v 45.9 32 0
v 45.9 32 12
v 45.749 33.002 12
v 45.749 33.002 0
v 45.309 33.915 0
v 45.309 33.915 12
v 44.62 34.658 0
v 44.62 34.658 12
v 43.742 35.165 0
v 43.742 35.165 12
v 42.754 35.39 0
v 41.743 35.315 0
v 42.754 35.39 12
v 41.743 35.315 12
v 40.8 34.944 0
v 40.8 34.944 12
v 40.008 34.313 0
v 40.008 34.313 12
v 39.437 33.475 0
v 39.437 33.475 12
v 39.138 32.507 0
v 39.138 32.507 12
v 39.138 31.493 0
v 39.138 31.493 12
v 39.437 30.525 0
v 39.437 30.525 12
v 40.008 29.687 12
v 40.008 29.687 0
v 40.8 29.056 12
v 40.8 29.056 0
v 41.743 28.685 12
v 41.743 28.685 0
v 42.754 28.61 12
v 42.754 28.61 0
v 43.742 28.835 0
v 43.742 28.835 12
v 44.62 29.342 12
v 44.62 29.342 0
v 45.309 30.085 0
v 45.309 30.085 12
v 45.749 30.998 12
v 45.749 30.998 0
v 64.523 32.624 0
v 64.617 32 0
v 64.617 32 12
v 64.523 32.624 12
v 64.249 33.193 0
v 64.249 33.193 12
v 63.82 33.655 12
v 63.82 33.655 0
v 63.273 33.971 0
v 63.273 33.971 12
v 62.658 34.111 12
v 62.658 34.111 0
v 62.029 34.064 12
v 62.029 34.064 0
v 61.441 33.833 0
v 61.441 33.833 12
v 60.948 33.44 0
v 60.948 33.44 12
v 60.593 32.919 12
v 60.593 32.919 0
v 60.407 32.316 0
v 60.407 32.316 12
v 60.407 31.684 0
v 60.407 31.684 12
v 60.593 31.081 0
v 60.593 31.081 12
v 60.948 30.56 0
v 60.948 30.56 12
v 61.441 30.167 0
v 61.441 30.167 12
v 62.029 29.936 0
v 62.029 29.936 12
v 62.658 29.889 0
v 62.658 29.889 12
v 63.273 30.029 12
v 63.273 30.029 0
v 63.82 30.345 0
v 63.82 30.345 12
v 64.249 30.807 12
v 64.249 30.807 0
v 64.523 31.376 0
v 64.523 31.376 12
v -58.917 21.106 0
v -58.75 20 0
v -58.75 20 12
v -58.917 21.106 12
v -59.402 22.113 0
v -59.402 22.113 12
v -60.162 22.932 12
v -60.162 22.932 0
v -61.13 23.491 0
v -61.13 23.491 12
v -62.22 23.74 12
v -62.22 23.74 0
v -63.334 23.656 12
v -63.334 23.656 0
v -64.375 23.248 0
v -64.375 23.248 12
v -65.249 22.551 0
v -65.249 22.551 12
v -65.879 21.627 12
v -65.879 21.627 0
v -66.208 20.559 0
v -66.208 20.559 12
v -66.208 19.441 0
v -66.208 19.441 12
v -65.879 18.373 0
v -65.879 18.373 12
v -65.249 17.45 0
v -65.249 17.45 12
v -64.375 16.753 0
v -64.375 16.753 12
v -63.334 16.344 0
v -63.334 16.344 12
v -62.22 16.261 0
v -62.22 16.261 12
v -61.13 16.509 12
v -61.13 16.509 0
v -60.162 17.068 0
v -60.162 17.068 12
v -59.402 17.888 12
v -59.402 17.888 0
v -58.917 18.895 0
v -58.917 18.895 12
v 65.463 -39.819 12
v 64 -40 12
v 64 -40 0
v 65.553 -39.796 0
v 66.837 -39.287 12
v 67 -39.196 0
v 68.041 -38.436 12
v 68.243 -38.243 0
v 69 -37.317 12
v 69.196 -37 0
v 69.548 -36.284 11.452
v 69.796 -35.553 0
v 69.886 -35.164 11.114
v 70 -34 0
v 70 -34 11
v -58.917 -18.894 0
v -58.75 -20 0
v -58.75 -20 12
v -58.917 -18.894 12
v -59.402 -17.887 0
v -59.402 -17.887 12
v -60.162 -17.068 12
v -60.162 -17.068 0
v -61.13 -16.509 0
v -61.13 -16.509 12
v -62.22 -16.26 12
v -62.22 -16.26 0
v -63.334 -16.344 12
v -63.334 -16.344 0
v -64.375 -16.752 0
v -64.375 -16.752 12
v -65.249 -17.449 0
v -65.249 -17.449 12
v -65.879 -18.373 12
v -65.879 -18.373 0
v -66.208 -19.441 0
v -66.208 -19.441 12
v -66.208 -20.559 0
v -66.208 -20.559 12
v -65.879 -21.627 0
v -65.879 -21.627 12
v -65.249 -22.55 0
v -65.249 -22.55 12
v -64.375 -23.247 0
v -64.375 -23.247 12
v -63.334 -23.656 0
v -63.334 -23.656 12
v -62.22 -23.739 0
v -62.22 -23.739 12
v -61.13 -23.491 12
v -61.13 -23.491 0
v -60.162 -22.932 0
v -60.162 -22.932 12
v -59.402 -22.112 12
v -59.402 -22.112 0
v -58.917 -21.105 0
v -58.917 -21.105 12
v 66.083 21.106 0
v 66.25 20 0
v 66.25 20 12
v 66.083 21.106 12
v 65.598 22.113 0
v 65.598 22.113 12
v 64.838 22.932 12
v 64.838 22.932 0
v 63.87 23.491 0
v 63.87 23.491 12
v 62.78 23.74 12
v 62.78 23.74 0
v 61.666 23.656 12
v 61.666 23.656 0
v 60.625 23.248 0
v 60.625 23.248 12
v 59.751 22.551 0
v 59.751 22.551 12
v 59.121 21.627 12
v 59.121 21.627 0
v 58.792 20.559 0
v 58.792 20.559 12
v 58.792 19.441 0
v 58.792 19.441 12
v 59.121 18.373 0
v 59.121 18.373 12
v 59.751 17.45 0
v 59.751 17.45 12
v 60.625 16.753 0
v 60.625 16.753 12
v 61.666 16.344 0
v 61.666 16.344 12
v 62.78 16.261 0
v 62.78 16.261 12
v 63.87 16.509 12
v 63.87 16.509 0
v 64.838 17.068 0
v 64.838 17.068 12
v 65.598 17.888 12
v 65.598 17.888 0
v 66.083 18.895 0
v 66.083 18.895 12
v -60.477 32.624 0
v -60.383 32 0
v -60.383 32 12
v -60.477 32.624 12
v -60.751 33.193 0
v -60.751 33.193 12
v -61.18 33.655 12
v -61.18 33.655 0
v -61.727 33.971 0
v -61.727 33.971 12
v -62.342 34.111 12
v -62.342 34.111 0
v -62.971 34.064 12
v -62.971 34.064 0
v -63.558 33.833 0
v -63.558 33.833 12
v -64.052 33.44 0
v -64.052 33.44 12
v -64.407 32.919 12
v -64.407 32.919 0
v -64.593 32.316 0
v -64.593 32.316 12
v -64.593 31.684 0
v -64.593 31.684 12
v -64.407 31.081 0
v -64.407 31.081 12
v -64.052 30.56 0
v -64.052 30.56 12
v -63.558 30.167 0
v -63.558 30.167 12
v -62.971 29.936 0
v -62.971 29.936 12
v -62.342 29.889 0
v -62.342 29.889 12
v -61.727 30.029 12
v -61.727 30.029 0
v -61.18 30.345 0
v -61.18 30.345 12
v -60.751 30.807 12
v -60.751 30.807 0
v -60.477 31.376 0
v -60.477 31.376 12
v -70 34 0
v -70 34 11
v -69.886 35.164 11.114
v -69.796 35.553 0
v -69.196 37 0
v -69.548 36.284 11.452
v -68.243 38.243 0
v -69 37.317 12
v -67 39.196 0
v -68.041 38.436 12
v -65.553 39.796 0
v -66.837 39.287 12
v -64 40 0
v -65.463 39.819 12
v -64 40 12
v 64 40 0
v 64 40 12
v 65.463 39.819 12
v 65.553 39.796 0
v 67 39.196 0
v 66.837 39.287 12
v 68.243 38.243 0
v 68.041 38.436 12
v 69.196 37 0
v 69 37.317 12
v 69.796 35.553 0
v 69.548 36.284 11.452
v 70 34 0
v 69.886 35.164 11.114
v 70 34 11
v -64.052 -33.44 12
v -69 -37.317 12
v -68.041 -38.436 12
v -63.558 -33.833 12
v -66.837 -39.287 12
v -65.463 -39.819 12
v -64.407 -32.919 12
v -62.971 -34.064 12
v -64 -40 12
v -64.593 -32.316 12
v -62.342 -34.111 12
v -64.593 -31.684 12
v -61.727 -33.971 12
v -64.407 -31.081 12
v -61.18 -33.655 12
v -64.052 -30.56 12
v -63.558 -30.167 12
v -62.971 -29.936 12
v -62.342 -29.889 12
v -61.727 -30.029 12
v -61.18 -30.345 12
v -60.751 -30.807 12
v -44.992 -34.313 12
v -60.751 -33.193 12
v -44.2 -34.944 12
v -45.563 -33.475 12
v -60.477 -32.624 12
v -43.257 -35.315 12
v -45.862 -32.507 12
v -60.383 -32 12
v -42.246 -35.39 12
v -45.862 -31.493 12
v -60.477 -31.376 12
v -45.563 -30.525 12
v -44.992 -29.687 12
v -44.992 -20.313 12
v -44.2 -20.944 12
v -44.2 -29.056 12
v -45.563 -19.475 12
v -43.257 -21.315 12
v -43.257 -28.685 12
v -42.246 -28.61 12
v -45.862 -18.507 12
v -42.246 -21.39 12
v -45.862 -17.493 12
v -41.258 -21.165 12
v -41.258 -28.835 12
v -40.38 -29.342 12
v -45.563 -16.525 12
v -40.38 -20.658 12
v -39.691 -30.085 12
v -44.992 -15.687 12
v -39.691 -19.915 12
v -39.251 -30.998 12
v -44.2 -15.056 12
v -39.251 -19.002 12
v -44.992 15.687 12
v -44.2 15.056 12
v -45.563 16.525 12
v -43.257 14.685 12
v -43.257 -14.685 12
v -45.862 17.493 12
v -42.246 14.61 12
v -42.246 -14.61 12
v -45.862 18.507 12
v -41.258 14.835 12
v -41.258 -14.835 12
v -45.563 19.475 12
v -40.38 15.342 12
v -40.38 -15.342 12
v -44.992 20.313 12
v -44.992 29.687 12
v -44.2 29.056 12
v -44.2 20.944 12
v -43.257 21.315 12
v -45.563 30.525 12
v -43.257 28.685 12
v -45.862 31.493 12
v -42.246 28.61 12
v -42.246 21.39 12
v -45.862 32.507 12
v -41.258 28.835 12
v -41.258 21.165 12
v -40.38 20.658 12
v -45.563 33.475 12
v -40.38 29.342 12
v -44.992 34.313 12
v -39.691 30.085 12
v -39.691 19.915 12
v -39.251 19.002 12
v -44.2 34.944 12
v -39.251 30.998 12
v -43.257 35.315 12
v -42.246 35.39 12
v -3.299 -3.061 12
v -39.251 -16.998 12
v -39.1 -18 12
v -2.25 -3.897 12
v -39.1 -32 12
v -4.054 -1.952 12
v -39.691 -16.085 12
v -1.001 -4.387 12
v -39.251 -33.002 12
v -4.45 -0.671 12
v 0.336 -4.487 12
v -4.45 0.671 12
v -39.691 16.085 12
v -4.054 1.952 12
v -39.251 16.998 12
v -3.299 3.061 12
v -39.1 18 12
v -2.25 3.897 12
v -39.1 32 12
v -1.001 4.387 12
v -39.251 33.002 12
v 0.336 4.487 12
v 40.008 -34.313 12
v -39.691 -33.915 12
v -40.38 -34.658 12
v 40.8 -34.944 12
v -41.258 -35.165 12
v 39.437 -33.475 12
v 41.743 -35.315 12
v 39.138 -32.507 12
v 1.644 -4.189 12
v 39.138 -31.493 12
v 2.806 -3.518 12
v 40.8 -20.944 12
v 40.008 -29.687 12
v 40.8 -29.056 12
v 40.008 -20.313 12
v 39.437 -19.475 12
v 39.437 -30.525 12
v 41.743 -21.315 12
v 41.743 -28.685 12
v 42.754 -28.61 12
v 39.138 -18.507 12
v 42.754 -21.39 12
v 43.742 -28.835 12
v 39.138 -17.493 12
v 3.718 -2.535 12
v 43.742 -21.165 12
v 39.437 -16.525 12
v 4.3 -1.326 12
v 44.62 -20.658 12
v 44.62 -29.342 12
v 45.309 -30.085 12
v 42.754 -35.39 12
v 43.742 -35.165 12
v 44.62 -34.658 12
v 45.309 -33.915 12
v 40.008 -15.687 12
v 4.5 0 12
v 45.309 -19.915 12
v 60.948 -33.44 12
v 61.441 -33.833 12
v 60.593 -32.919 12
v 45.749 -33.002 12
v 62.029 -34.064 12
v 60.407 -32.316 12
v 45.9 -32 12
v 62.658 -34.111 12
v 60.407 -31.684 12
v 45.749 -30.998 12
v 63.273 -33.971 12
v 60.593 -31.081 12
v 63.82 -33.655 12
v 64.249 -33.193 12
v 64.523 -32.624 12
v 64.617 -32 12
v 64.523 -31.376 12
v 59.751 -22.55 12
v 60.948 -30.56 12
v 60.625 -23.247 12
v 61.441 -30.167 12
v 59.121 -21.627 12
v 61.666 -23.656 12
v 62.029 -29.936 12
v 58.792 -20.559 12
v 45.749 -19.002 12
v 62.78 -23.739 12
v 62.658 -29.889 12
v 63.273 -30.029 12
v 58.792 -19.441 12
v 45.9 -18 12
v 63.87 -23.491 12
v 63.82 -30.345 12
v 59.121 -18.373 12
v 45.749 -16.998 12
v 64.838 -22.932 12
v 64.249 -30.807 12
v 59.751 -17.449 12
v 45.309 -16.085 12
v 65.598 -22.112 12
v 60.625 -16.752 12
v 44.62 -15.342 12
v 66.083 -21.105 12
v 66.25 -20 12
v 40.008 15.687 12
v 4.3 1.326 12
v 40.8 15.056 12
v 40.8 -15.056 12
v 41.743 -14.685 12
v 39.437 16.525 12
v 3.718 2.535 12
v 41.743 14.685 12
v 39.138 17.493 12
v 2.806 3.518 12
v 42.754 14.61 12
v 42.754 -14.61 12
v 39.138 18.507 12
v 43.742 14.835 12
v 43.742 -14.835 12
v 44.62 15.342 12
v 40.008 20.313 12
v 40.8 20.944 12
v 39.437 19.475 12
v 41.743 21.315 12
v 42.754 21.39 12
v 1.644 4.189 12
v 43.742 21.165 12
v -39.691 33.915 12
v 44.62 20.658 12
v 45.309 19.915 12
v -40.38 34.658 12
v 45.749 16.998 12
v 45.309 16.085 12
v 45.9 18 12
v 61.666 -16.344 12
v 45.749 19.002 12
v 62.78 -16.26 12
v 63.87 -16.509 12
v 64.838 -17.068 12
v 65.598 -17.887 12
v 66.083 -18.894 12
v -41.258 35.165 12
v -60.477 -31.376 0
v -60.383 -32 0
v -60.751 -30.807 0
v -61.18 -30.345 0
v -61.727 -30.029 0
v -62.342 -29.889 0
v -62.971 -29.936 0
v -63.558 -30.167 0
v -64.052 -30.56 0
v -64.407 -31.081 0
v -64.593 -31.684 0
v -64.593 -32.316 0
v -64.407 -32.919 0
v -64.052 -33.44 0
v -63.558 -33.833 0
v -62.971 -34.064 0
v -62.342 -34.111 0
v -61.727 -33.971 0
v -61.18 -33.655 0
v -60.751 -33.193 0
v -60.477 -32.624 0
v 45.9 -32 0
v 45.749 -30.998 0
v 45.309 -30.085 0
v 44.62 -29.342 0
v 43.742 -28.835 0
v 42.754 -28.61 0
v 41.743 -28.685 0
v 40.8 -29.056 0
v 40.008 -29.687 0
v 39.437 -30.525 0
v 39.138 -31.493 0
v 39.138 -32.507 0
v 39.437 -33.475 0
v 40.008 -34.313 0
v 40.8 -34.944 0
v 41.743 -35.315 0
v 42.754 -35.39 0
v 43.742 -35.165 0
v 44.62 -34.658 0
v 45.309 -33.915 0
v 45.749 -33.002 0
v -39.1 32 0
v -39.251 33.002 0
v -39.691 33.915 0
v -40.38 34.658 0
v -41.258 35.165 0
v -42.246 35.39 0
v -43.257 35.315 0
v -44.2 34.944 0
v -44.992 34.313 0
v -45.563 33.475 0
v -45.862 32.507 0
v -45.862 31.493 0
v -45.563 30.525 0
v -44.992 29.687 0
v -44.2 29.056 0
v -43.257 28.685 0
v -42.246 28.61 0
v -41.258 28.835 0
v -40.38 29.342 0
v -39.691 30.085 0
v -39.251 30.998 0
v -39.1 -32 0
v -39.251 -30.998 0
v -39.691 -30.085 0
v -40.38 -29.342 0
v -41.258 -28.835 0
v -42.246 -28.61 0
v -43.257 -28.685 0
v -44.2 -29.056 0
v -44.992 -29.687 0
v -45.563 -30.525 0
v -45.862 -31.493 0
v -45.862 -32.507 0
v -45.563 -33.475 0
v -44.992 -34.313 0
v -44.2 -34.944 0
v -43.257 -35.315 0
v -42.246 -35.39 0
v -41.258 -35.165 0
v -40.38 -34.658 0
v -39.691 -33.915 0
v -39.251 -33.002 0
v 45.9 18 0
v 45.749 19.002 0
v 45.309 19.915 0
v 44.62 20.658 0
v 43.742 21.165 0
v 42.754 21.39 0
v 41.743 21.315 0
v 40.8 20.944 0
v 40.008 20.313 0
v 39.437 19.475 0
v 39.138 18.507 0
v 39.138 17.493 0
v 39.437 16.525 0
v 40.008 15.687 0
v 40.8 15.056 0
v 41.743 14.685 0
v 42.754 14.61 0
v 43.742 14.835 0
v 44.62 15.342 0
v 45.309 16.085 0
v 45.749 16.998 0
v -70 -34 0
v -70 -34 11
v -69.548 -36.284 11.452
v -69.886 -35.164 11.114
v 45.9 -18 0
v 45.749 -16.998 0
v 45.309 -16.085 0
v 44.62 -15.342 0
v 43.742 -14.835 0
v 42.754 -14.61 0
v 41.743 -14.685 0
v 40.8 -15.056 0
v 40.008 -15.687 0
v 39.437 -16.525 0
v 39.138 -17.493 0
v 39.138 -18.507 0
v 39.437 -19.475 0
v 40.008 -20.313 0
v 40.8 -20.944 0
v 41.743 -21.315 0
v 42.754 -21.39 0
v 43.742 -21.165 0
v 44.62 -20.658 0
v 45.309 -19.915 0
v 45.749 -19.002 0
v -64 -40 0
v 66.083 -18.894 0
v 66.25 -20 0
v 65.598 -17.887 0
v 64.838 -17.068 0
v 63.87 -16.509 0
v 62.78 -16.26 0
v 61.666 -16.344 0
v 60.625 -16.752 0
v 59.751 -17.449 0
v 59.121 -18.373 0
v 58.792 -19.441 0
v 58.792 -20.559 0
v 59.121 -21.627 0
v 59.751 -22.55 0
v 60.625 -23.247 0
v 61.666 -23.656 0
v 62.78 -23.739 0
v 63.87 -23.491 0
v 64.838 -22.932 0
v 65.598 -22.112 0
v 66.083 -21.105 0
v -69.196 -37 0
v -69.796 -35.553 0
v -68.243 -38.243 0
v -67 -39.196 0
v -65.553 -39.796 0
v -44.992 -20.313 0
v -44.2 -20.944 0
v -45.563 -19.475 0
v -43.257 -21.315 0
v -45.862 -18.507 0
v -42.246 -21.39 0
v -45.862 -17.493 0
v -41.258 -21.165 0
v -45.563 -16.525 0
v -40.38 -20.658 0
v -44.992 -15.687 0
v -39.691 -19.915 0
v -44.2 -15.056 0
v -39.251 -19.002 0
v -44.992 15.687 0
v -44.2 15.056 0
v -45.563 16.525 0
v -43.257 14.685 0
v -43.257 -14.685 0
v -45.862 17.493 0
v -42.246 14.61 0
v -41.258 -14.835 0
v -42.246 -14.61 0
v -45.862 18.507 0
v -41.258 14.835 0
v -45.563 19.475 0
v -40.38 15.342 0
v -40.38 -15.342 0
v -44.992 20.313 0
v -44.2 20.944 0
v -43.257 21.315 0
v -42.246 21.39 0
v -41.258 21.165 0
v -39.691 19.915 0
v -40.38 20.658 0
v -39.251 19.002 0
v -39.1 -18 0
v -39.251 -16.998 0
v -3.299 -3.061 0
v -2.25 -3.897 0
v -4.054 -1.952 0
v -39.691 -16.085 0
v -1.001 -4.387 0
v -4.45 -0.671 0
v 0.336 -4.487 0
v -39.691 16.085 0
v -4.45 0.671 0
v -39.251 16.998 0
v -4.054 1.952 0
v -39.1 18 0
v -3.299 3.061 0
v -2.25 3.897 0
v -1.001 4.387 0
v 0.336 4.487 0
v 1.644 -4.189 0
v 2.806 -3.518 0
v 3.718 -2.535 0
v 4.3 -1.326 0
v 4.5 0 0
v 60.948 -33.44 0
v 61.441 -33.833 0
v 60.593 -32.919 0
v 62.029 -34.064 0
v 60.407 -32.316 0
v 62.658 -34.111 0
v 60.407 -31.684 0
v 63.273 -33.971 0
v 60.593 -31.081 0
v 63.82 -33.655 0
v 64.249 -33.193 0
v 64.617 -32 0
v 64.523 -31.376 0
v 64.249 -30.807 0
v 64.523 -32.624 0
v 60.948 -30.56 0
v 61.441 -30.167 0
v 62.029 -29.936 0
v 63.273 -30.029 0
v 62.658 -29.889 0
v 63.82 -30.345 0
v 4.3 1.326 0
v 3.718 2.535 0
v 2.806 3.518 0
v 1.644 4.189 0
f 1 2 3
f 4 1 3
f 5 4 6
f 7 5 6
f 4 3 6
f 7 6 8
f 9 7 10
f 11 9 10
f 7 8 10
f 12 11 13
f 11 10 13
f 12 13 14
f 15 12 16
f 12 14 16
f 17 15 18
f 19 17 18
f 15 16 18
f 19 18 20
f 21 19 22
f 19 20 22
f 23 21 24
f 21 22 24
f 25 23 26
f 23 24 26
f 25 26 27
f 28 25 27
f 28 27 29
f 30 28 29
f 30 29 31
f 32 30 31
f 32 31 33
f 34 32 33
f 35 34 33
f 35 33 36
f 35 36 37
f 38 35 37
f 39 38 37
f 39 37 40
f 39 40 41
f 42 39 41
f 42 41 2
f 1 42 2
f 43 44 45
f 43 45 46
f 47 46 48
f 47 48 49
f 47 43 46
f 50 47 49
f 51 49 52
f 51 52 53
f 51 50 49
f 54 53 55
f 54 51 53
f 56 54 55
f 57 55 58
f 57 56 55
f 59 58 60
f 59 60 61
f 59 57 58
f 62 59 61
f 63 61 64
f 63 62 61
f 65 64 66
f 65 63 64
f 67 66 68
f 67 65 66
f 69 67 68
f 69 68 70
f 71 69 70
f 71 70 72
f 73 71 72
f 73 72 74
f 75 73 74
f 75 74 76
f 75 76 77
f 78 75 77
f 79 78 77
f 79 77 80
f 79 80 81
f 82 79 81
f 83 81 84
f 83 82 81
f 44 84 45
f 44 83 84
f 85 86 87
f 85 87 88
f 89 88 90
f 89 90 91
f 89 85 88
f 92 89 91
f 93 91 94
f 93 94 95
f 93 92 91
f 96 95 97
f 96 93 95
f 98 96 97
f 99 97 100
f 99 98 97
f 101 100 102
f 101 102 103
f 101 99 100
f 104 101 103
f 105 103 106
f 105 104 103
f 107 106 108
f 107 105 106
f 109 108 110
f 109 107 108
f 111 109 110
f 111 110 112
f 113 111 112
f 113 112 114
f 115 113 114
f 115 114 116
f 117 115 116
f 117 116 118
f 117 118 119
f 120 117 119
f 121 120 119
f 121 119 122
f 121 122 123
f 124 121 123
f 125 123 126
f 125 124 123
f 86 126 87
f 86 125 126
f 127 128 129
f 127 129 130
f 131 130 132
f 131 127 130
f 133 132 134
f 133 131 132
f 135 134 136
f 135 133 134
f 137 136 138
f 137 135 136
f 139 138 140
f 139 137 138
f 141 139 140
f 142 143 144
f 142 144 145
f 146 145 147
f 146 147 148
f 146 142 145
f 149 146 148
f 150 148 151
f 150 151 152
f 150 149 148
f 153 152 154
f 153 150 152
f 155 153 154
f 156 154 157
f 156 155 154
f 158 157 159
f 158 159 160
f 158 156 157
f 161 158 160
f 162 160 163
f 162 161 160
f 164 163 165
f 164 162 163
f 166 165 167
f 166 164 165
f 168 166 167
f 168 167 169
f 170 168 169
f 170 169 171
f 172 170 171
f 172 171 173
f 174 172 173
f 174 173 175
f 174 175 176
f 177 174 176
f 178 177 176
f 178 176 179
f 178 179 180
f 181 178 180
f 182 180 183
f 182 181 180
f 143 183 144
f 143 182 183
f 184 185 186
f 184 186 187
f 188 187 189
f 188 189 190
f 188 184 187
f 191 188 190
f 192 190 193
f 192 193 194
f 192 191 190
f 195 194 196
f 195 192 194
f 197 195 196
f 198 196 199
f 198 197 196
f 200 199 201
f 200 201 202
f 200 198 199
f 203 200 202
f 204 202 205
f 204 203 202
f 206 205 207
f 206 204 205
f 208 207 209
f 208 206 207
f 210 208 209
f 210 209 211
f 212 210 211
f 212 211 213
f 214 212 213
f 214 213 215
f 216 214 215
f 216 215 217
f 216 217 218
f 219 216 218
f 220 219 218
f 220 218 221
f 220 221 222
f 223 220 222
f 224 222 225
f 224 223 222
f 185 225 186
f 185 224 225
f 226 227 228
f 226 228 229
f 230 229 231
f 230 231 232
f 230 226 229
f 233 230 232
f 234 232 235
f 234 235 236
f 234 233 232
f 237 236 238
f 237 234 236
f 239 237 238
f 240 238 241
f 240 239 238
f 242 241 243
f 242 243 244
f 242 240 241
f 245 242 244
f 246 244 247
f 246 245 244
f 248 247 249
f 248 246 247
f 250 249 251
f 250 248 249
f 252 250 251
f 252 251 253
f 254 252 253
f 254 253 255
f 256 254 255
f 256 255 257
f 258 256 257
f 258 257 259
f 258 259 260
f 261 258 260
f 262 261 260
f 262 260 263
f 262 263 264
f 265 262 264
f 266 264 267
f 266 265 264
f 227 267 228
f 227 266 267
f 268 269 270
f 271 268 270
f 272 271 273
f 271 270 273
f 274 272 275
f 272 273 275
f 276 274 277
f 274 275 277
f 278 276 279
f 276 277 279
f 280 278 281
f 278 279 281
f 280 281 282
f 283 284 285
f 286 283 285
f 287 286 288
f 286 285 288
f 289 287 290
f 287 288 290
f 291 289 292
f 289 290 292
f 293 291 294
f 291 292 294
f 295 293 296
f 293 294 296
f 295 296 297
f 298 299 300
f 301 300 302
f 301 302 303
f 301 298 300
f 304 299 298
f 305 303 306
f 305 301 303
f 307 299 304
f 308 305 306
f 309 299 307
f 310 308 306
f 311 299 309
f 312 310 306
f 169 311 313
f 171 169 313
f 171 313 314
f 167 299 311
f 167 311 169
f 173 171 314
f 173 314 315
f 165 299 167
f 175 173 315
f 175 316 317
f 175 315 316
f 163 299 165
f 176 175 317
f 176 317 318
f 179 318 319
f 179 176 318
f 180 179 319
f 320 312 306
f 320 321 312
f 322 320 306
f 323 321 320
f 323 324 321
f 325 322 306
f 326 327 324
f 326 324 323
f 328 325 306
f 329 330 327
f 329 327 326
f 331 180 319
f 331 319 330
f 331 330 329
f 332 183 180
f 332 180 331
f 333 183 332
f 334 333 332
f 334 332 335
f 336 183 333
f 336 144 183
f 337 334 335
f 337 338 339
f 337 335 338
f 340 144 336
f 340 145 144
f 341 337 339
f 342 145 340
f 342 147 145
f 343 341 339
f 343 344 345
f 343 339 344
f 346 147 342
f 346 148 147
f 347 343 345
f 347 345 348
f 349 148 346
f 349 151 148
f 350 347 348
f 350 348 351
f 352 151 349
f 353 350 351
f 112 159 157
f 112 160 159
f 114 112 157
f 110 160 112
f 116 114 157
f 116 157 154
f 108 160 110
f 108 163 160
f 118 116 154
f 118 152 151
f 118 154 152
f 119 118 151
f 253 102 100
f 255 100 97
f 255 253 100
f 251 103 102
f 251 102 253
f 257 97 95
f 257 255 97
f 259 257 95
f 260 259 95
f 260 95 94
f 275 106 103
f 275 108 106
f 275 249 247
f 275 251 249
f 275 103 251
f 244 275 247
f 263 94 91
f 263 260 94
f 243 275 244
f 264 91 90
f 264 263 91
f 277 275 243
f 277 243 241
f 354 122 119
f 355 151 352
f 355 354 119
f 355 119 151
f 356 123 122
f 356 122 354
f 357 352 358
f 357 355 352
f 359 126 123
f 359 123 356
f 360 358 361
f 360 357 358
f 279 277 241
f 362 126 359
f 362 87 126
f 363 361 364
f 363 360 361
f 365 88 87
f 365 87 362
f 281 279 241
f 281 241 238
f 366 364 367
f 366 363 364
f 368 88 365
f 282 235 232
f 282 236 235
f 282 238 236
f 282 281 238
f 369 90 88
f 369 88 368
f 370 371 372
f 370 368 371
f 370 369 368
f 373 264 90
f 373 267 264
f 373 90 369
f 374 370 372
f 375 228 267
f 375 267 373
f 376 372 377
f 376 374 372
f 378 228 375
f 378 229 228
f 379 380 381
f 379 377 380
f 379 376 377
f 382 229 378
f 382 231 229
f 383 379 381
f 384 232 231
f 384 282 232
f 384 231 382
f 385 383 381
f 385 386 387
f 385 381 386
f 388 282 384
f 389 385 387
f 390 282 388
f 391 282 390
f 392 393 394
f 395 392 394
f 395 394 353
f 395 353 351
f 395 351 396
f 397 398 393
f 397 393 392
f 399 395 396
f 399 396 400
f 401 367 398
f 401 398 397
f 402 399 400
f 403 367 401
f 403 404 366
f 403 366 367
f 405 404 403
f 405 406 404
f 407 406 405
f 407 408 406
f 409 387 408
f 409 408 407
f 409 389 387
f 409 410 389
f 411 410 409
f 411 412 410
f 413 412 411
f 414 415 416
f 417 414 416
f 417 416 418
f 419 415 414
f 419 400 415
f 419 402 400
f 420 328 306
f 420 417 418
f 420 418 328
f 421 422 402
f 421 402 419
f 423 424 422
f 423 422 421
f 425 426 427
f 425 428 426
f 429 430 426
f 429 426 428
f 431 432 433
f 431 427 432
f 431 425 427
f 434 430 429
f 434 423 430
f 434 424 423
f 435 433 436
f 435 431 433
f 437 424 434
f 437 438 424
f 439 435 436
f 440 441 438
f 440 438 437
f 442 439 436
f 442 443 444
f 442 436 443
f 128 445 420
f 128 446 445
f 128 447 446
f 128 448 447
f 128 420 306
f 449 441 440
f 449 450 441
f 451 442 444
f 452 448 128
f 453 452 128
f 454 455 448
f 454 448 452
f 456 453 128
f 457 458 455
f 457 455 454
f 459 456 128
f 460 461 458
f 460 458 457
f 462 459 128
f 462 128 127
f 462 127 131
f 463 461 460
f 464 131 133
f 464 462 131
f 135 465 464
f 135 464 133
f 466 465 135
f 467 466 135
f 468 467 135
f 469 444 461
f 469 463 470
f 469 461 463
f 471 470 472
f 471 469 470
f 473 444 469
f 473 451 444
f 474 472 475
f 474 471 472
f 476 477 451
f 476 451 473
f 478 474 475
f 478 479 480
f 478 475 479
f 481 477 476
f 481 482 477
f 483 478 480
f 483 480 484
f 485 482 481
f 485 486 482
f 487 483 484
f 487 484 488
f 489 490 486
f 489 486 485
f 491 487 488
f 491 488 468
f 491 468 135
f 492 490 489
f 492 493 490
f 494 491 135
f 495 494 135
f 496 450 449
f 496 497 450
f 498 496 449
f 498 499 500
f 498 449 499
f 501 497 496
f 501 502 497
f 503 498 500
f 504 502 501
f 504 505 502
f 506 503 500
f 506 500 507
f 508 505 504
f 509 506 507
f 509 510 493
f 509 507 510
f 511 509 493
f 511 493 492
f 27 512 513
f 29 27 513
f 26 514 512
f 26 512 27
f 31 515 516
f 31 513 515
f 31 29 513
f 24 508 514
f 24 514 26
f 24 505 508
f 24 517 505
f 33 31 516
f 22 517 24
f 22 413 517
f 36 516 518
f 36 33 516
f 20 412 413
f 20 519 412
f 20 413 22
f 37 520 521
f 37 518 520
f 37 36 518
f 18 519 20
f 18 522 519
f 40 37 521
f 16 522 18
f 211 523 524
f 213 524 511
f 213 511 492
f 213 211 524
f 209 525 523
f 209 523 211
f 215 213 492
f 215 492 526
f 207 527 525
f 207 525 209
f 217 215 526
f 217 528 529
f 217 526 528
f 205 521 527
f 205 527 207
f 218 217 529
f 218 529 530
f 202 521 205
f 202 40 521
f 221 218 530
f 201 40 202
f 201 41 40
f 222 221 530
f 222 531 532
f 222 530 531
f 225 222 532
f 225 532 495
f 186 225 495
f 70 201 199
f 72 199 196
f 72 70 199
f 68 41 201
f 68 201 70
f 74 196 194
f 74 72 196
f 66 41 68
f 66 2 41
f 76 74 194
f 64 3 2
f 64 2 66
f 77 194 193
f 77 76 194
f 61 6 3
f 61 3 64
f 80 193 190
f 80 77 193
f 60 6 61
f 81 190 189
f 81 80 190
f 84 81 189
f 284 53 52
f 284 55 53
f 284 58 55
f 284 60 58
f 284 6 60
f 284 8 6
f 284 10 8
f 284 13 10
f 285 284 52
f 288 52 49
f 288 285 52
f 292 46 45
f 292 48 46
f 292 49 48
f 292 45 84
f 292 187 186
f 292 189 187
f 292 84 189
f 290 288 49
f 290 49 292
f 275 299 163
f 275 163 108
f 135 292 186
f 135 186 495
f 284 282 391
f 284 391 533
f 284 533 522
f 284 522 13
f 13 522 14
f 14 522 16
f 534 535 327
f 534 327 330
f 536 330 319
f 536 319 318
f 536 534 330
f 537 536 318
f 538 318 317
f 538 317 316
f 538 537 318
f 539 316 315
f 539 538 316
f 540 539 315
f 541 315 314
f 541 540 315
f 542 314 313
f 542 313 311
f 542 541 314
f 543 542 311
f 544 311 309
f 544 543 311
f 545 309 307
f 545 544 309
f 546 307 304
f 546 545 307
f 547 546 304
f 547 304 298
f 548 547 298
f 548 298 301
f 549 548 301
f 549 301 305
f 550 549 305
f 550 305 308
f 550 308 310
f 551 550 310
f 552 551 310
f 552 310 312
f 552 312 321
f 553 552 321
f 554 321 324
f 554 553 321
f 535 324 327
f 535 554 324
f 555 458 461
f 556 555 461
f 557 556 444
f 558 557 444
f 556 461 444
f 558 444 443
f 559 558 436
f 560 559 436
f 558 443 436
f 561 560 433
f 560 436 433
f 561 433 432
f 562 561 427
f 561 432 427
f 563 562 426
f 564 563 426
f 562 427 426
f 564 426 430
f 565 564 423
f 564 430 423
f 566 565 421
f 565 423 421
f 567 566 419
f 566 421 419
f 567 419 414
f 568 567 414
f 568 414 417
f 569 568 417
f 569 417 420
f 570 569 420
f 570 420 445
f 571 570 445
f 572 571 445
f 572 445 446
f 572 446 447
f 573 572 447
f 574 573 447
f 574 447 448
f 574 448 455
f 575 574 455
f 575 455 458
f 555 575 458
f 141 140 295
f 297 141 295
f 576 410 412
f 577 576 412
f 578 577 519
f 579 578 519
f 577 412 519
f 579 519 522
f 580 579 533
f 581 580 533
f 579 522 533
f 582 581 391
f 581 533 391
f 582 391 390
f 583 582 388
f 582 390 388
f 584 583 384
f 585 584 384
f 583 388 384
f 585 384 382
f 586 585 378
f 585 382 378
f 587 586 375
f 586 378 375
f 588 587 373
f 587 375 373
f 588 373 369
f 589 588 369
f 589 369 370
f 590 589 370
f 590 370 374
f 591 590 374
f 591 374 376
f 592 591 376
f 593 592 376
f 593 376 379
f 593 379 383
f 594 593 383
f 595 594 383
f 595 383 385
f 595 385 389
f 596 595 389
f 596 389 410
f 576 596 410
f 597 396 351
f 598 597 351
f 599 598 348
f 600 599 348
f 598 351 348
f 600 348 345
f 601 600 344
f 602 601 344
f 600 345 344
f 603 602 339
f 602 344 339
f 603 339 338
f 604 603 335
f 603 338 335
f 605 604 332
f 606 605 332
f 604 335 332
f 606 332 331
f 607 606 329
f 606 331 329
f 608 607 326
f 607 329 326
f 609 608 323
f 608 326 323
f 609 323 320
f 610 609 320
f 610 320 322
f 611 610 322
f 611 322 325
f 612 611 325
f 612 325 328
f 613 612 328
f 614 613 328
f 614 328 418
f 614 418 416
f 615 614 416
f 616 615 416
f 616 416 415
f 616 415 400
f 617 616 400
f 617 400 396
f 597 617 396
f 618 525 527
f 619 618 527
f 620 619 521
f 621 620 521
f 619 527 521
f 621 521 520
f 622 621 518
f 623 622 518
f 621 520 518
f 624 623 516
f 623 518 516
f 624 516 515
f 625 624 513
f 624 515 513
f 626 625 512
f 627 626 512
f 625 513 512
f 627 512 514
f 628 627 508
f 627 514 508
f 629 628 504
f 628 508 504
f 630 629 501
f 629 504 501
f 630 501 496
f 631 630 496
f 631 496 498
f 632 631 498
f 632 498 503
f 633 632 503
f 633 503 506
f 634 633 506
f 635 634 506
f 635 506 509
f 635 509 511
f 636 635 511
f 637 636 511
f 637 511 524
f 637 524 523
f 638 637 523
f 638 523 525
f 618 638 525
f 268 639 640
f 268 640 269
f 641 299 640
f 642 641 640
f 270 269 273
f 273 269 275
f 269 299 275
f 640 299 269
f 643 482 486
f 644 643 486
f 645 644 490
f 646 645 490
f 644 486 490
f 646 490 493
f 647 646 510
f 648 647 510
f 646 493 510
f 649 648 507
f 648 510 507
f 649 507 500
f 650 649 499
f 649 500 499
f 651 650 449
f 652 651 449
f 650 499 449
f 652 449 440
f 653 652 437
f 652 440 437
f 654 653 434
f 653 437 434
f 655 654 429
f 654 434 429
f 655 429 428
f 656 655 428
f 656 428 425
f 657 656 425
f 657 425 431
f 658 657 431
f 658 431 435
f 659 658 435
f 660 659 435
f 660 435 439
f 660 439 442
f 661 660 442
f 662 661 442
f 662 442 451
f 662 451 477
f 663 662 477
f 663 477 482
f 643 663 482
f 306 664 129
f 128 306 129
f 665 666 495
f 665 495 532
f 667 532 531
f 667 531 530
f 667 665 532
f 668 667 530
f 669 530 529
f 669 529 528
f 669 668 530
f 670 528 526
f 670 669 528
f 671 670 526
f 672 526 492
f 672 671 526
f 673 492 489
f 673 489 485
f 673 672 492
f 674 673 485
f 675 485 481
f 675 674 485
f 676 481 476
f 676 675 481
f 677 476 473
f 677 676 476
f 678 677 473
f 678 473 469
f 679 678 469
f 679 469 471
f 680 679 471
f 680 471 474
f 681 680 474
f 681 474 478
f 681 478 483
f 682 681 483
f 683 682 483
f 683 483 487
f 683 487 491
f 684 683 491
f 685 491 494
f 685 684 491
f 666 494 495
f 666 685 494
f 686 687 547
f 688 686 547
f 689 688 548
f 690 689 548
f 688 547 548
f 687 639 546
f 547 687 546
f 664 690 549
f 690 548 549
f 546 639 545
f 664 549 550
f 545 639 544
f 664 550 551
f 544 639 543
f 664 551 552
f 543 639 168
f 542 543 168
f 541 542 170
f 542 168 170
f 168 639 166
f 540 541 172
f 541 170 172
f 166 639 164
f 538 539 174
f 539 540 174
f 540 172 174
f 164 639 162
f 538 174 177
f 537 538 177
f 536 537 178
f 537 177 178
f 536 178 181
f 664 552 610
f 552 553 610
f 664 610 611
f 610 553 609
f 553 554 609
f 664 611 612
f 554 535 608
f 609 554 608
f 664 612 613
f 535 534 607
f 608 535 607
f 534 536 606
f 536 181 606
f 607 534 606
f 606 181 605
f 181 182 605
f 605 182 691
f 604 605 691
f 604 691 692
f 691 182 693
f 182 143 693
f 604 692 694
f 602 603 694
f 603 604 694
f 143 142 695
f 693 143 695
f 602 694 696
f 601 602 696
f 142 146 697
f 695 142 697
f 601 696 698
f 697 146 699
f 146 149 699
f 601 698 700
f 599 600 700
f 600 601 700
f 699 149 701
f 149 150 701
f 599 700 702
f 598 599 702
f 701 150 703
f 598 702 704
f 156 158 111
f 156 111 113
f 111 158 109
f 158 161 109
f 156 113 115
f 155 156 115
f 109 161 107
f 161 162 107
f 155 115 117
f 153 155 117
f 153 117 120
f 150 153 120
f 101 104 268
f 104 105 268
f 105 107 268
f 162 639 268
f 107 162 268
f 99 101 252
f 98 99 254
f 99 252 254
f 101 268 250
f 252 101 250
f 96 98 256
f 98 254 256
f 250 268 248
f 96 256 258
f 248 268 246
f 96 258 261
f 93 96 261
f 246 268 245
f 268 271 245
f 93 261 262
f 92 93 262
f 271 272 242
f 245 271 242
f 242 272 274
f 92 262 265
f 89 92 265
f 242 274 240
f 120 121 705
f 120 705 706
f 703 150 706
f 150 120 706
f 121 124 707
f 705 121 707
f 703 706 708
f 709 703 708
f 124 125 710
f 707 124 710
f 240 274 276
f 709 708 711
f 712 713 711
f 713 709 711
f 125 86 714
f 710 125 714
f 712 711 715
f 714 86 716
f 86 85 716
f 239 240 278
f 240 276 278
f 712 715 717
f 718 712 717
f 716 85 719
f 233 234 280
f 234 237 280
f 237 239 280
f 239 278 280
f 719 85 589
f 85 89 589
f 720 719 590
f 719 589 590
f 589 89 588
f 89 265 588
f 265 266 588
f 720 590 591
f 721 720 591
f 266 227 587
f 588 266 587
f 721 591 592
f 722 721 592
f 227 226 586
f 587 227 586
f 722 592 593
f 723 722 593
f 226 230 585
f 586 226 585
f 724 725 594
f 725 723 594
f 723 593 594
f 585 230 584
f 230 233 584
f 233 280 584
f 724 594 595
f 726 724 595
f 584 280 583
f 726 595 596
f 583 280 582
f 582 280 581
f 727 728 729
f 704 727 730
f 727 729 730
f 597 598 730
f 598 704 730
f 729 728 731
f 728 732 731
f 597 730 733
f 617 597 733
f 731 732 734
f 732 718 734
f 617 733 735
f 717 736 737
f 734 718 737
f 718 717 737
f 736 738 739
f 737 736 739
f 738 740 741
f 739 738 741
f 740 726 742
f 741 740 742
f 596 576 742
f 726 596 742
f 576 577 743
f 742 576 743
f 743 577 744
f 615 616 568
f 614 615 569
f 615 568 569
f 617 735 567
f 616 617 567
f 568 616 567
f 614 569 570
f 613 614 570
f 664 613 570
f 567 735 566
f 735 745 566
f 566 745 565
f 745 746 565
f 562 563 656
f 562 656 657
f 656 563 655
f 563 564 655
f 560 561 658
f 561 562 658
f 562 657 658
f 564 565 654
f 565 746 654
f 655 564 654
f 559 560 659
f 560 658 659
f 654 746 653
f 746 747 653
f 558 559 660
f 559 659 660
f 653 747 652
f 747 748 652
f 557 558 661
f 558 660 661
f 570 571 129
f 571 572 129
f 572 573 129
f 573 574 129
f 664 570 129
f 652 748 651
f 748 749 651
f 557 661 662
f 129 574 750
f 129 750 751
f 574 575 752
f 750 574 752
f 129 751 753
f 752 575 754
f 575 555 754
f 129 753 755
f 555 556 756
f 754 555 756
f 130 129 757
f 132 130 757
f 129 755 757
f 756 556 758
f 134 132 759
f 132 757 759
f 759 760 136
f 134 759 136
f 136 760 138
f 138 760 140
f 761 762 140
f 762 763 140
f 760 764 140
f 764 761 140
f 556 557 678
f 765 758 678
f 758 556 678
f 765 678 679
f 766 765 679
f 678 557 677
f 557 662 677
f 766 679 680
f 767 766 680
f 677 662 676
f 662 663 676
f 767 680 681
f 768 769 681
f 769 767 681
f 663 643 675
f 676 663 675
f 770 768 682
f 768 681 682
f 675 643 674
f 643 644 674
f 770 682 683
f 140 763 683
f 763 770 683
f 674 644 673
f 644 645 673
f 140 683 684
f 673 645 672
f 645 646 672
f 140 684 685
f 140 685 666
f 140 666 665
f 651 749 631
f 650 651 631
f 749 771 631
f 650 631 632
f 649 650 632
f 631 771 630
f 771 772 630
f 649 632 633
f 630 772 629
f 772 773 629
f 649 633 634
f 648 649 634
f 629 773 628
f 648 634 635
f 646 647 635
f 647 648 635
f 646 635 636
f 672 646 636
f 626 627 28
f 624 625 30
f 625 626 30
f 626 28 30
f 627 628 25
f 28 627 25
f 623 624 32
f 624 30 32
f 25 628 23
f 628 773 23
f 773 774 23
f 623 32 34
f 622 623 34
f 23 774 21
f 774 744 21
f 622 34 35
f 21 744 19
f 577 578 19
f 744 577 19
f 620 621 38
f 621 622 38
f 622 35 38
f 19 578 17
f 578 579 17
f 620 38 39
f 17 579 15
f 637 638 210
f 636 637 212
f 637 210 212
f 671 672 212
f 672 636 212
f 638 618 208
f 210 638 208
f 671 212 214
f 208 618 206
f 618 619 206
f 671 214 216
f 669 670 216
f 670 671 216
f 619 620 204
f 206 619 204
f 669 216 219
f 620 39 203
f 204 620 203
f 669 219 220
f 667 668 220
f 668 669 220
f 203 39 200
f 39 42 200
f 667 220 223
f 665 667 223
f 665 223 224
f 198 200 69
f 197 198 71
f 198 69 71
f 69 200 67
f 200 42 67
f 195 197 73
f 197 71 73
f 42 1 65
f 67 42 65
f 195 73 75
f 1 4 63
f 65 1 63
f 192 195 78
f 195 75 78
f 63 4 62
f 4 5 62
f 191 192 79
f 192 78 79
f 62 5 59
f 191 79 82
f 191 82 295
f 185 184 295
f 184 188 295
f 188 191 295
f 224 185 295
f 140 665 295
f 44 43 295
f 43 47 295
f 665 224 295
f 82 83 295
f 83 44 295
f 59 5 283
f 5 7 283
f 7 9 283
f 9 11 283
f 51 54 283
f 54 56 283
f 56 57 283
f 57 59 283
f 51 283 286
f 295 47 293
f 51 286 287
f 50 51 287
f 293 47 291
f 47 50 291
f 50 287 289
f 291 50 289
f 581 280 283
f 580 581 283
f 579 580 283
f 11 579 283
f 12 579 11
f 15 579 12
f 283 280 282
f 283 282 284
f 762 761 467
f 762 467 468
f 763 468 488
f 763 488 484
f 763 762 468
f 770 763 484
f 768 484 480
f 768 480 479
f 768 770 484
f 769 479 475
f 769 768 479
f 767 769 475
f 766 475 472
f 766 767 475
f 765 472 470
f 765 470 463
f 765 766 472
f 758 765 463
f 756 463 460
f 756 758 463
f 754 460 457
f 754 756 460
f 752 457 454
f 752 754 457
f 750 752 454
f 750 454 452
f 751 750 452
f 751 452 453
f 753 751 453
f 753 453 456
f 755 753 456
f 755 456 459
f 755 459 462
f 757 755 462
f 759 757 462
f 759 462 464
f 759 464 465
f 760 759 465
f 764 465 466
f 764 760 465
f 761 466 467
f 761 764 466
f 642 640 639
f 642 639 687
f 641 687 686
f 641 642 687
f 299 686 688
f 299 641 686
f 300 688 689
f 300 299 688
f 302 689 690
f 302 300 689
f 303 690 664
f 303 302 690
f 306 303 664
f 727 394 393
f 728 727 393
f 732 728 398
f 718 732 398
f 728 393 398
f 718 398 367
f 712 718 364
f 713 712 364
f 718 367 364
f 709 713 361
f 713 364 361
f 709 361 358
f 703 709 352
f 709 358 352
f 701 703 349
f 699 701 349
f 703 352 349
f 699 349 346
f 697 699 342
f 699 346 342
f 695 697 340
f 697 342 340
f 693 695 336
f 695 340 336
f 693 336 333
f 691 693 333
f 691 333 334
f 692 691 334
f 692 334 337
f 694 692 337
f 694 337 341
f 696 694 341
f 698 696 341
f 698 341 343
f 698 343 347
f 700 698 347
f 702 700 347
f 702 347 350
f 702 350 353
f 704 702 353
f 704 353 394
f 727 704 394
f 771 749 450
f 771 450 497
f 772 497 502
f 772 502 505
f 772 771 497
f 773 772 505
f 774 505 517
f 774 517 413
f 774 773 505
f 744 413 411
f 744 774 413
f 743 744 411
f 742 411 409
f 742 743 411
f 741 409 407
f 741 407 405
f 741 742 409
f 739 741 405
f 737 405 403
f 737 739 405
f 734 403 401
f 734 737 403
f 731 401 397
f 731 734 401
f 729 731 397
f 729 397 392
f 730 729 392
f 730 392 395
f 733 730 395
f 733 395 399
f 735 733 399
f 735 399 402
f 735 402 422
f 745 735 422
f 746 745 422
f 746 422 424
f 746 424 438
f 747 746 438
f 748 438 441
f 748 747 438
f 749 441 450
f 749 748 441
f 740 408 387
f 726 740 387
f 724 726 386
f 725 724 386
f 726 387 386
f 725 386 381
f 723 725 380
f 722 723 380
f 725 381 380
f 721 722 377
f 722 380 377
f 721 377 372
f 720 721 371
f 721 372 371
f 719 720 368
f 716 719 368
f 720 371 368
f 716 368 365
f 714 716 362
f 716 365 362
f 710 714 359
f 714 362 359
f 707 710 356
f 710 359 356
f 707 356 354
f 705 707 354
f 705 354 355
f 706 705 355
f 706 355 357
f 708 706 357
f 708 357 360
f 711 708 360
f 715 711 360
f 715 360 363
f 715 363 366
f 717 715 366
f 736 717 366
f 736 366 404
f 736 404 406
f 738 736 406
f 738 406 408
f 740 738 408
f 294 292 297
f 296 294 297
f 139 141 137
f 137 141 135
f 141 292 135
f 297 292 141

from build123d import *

# Parameters (mm, degrees)
SKETCH1_W           = 140
SKETCH1_H           = 80
SKETCH1_R           = 2.117
SKETCH1_R_2         = 3.75
SKETCH1_R_3         = 4.5
BOSS_EXTRUDE1_DEPTH = 12
SKETCH2_R           = 3.4
CUT_EXTRUDE1_DEPTH  = 82.510735489
FILLET1_R           = 6


with BuildPart() as part:
    # Sketch1 → Boss-Extrude1 (new body)
    with BuildSketch(Plane.XY):
        Rectangle(SKETCH1_W, SKETCH1_H)
        with Locations((-62.499963671, 32)):
            Circle(SKETCH1_R, mode=Mode.SUBTRACT)
        with Locations((-62.500002371, 20.00021325)):
            Circle(SKETCH1_R_2, mode=Mode.SUBTRACT)
        with Locations((-62.499963671, -32)):
            Circle(SKETCH1_R, mode=Mode.SUBTRACT)
        with Locations((-62.500002371, -19.99978675)):
            Circle(SKETCH1_R_2, mode=Mode.SUBTRACT)
        Circle(SKETCH1_R_3, mode=Mode.SUBTRACT)
        with Locations((62.499963671, 32)):
            Circle(SKETCH1_R, mode=Mode.SUBTRACT)
        with Locations((62.499997629, 20.00021325)):
            Circle(SKETCH1_R_2, mode=Mode.SUBTRACT)
        with Locations((62.499997629, -19.99978675)):
            Circle(SKETCH1_R_2, mode=Mode.SUBTRACT)
        with Locations((62.499963671, -32)):
            Circle(SKETCH1_R, mode=Mode.SUBTRACT)
    extrude(amount=BOSS_EXTRUDE1_DEPTH)

    # Sketch2 → Cut-Extrude1 (cut, through all)
    with BuildSketch(Plane.XY.offset(12)):
        with Locations((42.499997629, 32)):
            Circle(SKETCH2_R)
        with Locations((-42.500002371, 32)):
            Circle(SKETCH2_R)
        with Locations((-42.500002371, 18)):
            Circle(SKETCH2_R)
        with Locations((42.499997629, 18)):
            Circle(SKETCH2_R)
        with Locations((42.499997629, -18)):
            Circle(SKETCH2_R)
        with Locations((42.499997629, -32)):
            Circle(SKETCH2_R)
        with Locations((-42.500002371, -32)):
            Circle(SKETCH2_R)
        with Locations((-42.500002371, -18)):
            Circle(SKETCH2_R)
    extrude(amount=-CUT_EXTRUDE1_DEPTH, mode=Mode.SUBTRACT)

    # Fillet1
    fillet1_edges = [part.edges().sort_by_distance(p)[0] for p in [
        (70, -40, 6),
        (-70, -40, 6),
        (-70, 40, 6),
        (70, 40, 6),
    ]]
    fillet(fillet1_edges, radius=FILLET1_R)

    # Chamfer1
    # the kernel refuses this chamfer: 1 mm, written as the material it takes off along each edge
    with BuildSketch(Plane(origin=(-70, 40.172039171, 12), x_dir=(0.9996219169112968, 0, 0.02749587661058574), z_dir=(0, -1, 0)), Plane(origin=(70, -40.172039171, 12), x_dir=(-0.9996219169112968, 0, 0.02749587661058574), z_dir=(0, 1, 0))) as chamfer1_piece_1:
        with BuildLine():
            Line((1.028673195, 0), (-0.056547155, -1.027117794))
            Line((-0.056547155, -1.027117794), (-0.076539593, -1.026567876))
            ThreePointArc((-0.076539593, -1.026567876), (-0.034129227, -0.51339783), (-0.019992438, 0.000549918))
            Line((-0.019992438, 0.000549918), (0.000549918, 0.019992438))
            ThreePointArc((0.000549918, 0.019992438), (0.514497665, 0.00585565), (1.029223113, 0.019992438))
            Line((1.029223113, 0.019992438), (1.028673195, 0))
        make_face()
    extrude(amount=80.344078342, mode=Mode.SUBTRACT)


solid = part.part
